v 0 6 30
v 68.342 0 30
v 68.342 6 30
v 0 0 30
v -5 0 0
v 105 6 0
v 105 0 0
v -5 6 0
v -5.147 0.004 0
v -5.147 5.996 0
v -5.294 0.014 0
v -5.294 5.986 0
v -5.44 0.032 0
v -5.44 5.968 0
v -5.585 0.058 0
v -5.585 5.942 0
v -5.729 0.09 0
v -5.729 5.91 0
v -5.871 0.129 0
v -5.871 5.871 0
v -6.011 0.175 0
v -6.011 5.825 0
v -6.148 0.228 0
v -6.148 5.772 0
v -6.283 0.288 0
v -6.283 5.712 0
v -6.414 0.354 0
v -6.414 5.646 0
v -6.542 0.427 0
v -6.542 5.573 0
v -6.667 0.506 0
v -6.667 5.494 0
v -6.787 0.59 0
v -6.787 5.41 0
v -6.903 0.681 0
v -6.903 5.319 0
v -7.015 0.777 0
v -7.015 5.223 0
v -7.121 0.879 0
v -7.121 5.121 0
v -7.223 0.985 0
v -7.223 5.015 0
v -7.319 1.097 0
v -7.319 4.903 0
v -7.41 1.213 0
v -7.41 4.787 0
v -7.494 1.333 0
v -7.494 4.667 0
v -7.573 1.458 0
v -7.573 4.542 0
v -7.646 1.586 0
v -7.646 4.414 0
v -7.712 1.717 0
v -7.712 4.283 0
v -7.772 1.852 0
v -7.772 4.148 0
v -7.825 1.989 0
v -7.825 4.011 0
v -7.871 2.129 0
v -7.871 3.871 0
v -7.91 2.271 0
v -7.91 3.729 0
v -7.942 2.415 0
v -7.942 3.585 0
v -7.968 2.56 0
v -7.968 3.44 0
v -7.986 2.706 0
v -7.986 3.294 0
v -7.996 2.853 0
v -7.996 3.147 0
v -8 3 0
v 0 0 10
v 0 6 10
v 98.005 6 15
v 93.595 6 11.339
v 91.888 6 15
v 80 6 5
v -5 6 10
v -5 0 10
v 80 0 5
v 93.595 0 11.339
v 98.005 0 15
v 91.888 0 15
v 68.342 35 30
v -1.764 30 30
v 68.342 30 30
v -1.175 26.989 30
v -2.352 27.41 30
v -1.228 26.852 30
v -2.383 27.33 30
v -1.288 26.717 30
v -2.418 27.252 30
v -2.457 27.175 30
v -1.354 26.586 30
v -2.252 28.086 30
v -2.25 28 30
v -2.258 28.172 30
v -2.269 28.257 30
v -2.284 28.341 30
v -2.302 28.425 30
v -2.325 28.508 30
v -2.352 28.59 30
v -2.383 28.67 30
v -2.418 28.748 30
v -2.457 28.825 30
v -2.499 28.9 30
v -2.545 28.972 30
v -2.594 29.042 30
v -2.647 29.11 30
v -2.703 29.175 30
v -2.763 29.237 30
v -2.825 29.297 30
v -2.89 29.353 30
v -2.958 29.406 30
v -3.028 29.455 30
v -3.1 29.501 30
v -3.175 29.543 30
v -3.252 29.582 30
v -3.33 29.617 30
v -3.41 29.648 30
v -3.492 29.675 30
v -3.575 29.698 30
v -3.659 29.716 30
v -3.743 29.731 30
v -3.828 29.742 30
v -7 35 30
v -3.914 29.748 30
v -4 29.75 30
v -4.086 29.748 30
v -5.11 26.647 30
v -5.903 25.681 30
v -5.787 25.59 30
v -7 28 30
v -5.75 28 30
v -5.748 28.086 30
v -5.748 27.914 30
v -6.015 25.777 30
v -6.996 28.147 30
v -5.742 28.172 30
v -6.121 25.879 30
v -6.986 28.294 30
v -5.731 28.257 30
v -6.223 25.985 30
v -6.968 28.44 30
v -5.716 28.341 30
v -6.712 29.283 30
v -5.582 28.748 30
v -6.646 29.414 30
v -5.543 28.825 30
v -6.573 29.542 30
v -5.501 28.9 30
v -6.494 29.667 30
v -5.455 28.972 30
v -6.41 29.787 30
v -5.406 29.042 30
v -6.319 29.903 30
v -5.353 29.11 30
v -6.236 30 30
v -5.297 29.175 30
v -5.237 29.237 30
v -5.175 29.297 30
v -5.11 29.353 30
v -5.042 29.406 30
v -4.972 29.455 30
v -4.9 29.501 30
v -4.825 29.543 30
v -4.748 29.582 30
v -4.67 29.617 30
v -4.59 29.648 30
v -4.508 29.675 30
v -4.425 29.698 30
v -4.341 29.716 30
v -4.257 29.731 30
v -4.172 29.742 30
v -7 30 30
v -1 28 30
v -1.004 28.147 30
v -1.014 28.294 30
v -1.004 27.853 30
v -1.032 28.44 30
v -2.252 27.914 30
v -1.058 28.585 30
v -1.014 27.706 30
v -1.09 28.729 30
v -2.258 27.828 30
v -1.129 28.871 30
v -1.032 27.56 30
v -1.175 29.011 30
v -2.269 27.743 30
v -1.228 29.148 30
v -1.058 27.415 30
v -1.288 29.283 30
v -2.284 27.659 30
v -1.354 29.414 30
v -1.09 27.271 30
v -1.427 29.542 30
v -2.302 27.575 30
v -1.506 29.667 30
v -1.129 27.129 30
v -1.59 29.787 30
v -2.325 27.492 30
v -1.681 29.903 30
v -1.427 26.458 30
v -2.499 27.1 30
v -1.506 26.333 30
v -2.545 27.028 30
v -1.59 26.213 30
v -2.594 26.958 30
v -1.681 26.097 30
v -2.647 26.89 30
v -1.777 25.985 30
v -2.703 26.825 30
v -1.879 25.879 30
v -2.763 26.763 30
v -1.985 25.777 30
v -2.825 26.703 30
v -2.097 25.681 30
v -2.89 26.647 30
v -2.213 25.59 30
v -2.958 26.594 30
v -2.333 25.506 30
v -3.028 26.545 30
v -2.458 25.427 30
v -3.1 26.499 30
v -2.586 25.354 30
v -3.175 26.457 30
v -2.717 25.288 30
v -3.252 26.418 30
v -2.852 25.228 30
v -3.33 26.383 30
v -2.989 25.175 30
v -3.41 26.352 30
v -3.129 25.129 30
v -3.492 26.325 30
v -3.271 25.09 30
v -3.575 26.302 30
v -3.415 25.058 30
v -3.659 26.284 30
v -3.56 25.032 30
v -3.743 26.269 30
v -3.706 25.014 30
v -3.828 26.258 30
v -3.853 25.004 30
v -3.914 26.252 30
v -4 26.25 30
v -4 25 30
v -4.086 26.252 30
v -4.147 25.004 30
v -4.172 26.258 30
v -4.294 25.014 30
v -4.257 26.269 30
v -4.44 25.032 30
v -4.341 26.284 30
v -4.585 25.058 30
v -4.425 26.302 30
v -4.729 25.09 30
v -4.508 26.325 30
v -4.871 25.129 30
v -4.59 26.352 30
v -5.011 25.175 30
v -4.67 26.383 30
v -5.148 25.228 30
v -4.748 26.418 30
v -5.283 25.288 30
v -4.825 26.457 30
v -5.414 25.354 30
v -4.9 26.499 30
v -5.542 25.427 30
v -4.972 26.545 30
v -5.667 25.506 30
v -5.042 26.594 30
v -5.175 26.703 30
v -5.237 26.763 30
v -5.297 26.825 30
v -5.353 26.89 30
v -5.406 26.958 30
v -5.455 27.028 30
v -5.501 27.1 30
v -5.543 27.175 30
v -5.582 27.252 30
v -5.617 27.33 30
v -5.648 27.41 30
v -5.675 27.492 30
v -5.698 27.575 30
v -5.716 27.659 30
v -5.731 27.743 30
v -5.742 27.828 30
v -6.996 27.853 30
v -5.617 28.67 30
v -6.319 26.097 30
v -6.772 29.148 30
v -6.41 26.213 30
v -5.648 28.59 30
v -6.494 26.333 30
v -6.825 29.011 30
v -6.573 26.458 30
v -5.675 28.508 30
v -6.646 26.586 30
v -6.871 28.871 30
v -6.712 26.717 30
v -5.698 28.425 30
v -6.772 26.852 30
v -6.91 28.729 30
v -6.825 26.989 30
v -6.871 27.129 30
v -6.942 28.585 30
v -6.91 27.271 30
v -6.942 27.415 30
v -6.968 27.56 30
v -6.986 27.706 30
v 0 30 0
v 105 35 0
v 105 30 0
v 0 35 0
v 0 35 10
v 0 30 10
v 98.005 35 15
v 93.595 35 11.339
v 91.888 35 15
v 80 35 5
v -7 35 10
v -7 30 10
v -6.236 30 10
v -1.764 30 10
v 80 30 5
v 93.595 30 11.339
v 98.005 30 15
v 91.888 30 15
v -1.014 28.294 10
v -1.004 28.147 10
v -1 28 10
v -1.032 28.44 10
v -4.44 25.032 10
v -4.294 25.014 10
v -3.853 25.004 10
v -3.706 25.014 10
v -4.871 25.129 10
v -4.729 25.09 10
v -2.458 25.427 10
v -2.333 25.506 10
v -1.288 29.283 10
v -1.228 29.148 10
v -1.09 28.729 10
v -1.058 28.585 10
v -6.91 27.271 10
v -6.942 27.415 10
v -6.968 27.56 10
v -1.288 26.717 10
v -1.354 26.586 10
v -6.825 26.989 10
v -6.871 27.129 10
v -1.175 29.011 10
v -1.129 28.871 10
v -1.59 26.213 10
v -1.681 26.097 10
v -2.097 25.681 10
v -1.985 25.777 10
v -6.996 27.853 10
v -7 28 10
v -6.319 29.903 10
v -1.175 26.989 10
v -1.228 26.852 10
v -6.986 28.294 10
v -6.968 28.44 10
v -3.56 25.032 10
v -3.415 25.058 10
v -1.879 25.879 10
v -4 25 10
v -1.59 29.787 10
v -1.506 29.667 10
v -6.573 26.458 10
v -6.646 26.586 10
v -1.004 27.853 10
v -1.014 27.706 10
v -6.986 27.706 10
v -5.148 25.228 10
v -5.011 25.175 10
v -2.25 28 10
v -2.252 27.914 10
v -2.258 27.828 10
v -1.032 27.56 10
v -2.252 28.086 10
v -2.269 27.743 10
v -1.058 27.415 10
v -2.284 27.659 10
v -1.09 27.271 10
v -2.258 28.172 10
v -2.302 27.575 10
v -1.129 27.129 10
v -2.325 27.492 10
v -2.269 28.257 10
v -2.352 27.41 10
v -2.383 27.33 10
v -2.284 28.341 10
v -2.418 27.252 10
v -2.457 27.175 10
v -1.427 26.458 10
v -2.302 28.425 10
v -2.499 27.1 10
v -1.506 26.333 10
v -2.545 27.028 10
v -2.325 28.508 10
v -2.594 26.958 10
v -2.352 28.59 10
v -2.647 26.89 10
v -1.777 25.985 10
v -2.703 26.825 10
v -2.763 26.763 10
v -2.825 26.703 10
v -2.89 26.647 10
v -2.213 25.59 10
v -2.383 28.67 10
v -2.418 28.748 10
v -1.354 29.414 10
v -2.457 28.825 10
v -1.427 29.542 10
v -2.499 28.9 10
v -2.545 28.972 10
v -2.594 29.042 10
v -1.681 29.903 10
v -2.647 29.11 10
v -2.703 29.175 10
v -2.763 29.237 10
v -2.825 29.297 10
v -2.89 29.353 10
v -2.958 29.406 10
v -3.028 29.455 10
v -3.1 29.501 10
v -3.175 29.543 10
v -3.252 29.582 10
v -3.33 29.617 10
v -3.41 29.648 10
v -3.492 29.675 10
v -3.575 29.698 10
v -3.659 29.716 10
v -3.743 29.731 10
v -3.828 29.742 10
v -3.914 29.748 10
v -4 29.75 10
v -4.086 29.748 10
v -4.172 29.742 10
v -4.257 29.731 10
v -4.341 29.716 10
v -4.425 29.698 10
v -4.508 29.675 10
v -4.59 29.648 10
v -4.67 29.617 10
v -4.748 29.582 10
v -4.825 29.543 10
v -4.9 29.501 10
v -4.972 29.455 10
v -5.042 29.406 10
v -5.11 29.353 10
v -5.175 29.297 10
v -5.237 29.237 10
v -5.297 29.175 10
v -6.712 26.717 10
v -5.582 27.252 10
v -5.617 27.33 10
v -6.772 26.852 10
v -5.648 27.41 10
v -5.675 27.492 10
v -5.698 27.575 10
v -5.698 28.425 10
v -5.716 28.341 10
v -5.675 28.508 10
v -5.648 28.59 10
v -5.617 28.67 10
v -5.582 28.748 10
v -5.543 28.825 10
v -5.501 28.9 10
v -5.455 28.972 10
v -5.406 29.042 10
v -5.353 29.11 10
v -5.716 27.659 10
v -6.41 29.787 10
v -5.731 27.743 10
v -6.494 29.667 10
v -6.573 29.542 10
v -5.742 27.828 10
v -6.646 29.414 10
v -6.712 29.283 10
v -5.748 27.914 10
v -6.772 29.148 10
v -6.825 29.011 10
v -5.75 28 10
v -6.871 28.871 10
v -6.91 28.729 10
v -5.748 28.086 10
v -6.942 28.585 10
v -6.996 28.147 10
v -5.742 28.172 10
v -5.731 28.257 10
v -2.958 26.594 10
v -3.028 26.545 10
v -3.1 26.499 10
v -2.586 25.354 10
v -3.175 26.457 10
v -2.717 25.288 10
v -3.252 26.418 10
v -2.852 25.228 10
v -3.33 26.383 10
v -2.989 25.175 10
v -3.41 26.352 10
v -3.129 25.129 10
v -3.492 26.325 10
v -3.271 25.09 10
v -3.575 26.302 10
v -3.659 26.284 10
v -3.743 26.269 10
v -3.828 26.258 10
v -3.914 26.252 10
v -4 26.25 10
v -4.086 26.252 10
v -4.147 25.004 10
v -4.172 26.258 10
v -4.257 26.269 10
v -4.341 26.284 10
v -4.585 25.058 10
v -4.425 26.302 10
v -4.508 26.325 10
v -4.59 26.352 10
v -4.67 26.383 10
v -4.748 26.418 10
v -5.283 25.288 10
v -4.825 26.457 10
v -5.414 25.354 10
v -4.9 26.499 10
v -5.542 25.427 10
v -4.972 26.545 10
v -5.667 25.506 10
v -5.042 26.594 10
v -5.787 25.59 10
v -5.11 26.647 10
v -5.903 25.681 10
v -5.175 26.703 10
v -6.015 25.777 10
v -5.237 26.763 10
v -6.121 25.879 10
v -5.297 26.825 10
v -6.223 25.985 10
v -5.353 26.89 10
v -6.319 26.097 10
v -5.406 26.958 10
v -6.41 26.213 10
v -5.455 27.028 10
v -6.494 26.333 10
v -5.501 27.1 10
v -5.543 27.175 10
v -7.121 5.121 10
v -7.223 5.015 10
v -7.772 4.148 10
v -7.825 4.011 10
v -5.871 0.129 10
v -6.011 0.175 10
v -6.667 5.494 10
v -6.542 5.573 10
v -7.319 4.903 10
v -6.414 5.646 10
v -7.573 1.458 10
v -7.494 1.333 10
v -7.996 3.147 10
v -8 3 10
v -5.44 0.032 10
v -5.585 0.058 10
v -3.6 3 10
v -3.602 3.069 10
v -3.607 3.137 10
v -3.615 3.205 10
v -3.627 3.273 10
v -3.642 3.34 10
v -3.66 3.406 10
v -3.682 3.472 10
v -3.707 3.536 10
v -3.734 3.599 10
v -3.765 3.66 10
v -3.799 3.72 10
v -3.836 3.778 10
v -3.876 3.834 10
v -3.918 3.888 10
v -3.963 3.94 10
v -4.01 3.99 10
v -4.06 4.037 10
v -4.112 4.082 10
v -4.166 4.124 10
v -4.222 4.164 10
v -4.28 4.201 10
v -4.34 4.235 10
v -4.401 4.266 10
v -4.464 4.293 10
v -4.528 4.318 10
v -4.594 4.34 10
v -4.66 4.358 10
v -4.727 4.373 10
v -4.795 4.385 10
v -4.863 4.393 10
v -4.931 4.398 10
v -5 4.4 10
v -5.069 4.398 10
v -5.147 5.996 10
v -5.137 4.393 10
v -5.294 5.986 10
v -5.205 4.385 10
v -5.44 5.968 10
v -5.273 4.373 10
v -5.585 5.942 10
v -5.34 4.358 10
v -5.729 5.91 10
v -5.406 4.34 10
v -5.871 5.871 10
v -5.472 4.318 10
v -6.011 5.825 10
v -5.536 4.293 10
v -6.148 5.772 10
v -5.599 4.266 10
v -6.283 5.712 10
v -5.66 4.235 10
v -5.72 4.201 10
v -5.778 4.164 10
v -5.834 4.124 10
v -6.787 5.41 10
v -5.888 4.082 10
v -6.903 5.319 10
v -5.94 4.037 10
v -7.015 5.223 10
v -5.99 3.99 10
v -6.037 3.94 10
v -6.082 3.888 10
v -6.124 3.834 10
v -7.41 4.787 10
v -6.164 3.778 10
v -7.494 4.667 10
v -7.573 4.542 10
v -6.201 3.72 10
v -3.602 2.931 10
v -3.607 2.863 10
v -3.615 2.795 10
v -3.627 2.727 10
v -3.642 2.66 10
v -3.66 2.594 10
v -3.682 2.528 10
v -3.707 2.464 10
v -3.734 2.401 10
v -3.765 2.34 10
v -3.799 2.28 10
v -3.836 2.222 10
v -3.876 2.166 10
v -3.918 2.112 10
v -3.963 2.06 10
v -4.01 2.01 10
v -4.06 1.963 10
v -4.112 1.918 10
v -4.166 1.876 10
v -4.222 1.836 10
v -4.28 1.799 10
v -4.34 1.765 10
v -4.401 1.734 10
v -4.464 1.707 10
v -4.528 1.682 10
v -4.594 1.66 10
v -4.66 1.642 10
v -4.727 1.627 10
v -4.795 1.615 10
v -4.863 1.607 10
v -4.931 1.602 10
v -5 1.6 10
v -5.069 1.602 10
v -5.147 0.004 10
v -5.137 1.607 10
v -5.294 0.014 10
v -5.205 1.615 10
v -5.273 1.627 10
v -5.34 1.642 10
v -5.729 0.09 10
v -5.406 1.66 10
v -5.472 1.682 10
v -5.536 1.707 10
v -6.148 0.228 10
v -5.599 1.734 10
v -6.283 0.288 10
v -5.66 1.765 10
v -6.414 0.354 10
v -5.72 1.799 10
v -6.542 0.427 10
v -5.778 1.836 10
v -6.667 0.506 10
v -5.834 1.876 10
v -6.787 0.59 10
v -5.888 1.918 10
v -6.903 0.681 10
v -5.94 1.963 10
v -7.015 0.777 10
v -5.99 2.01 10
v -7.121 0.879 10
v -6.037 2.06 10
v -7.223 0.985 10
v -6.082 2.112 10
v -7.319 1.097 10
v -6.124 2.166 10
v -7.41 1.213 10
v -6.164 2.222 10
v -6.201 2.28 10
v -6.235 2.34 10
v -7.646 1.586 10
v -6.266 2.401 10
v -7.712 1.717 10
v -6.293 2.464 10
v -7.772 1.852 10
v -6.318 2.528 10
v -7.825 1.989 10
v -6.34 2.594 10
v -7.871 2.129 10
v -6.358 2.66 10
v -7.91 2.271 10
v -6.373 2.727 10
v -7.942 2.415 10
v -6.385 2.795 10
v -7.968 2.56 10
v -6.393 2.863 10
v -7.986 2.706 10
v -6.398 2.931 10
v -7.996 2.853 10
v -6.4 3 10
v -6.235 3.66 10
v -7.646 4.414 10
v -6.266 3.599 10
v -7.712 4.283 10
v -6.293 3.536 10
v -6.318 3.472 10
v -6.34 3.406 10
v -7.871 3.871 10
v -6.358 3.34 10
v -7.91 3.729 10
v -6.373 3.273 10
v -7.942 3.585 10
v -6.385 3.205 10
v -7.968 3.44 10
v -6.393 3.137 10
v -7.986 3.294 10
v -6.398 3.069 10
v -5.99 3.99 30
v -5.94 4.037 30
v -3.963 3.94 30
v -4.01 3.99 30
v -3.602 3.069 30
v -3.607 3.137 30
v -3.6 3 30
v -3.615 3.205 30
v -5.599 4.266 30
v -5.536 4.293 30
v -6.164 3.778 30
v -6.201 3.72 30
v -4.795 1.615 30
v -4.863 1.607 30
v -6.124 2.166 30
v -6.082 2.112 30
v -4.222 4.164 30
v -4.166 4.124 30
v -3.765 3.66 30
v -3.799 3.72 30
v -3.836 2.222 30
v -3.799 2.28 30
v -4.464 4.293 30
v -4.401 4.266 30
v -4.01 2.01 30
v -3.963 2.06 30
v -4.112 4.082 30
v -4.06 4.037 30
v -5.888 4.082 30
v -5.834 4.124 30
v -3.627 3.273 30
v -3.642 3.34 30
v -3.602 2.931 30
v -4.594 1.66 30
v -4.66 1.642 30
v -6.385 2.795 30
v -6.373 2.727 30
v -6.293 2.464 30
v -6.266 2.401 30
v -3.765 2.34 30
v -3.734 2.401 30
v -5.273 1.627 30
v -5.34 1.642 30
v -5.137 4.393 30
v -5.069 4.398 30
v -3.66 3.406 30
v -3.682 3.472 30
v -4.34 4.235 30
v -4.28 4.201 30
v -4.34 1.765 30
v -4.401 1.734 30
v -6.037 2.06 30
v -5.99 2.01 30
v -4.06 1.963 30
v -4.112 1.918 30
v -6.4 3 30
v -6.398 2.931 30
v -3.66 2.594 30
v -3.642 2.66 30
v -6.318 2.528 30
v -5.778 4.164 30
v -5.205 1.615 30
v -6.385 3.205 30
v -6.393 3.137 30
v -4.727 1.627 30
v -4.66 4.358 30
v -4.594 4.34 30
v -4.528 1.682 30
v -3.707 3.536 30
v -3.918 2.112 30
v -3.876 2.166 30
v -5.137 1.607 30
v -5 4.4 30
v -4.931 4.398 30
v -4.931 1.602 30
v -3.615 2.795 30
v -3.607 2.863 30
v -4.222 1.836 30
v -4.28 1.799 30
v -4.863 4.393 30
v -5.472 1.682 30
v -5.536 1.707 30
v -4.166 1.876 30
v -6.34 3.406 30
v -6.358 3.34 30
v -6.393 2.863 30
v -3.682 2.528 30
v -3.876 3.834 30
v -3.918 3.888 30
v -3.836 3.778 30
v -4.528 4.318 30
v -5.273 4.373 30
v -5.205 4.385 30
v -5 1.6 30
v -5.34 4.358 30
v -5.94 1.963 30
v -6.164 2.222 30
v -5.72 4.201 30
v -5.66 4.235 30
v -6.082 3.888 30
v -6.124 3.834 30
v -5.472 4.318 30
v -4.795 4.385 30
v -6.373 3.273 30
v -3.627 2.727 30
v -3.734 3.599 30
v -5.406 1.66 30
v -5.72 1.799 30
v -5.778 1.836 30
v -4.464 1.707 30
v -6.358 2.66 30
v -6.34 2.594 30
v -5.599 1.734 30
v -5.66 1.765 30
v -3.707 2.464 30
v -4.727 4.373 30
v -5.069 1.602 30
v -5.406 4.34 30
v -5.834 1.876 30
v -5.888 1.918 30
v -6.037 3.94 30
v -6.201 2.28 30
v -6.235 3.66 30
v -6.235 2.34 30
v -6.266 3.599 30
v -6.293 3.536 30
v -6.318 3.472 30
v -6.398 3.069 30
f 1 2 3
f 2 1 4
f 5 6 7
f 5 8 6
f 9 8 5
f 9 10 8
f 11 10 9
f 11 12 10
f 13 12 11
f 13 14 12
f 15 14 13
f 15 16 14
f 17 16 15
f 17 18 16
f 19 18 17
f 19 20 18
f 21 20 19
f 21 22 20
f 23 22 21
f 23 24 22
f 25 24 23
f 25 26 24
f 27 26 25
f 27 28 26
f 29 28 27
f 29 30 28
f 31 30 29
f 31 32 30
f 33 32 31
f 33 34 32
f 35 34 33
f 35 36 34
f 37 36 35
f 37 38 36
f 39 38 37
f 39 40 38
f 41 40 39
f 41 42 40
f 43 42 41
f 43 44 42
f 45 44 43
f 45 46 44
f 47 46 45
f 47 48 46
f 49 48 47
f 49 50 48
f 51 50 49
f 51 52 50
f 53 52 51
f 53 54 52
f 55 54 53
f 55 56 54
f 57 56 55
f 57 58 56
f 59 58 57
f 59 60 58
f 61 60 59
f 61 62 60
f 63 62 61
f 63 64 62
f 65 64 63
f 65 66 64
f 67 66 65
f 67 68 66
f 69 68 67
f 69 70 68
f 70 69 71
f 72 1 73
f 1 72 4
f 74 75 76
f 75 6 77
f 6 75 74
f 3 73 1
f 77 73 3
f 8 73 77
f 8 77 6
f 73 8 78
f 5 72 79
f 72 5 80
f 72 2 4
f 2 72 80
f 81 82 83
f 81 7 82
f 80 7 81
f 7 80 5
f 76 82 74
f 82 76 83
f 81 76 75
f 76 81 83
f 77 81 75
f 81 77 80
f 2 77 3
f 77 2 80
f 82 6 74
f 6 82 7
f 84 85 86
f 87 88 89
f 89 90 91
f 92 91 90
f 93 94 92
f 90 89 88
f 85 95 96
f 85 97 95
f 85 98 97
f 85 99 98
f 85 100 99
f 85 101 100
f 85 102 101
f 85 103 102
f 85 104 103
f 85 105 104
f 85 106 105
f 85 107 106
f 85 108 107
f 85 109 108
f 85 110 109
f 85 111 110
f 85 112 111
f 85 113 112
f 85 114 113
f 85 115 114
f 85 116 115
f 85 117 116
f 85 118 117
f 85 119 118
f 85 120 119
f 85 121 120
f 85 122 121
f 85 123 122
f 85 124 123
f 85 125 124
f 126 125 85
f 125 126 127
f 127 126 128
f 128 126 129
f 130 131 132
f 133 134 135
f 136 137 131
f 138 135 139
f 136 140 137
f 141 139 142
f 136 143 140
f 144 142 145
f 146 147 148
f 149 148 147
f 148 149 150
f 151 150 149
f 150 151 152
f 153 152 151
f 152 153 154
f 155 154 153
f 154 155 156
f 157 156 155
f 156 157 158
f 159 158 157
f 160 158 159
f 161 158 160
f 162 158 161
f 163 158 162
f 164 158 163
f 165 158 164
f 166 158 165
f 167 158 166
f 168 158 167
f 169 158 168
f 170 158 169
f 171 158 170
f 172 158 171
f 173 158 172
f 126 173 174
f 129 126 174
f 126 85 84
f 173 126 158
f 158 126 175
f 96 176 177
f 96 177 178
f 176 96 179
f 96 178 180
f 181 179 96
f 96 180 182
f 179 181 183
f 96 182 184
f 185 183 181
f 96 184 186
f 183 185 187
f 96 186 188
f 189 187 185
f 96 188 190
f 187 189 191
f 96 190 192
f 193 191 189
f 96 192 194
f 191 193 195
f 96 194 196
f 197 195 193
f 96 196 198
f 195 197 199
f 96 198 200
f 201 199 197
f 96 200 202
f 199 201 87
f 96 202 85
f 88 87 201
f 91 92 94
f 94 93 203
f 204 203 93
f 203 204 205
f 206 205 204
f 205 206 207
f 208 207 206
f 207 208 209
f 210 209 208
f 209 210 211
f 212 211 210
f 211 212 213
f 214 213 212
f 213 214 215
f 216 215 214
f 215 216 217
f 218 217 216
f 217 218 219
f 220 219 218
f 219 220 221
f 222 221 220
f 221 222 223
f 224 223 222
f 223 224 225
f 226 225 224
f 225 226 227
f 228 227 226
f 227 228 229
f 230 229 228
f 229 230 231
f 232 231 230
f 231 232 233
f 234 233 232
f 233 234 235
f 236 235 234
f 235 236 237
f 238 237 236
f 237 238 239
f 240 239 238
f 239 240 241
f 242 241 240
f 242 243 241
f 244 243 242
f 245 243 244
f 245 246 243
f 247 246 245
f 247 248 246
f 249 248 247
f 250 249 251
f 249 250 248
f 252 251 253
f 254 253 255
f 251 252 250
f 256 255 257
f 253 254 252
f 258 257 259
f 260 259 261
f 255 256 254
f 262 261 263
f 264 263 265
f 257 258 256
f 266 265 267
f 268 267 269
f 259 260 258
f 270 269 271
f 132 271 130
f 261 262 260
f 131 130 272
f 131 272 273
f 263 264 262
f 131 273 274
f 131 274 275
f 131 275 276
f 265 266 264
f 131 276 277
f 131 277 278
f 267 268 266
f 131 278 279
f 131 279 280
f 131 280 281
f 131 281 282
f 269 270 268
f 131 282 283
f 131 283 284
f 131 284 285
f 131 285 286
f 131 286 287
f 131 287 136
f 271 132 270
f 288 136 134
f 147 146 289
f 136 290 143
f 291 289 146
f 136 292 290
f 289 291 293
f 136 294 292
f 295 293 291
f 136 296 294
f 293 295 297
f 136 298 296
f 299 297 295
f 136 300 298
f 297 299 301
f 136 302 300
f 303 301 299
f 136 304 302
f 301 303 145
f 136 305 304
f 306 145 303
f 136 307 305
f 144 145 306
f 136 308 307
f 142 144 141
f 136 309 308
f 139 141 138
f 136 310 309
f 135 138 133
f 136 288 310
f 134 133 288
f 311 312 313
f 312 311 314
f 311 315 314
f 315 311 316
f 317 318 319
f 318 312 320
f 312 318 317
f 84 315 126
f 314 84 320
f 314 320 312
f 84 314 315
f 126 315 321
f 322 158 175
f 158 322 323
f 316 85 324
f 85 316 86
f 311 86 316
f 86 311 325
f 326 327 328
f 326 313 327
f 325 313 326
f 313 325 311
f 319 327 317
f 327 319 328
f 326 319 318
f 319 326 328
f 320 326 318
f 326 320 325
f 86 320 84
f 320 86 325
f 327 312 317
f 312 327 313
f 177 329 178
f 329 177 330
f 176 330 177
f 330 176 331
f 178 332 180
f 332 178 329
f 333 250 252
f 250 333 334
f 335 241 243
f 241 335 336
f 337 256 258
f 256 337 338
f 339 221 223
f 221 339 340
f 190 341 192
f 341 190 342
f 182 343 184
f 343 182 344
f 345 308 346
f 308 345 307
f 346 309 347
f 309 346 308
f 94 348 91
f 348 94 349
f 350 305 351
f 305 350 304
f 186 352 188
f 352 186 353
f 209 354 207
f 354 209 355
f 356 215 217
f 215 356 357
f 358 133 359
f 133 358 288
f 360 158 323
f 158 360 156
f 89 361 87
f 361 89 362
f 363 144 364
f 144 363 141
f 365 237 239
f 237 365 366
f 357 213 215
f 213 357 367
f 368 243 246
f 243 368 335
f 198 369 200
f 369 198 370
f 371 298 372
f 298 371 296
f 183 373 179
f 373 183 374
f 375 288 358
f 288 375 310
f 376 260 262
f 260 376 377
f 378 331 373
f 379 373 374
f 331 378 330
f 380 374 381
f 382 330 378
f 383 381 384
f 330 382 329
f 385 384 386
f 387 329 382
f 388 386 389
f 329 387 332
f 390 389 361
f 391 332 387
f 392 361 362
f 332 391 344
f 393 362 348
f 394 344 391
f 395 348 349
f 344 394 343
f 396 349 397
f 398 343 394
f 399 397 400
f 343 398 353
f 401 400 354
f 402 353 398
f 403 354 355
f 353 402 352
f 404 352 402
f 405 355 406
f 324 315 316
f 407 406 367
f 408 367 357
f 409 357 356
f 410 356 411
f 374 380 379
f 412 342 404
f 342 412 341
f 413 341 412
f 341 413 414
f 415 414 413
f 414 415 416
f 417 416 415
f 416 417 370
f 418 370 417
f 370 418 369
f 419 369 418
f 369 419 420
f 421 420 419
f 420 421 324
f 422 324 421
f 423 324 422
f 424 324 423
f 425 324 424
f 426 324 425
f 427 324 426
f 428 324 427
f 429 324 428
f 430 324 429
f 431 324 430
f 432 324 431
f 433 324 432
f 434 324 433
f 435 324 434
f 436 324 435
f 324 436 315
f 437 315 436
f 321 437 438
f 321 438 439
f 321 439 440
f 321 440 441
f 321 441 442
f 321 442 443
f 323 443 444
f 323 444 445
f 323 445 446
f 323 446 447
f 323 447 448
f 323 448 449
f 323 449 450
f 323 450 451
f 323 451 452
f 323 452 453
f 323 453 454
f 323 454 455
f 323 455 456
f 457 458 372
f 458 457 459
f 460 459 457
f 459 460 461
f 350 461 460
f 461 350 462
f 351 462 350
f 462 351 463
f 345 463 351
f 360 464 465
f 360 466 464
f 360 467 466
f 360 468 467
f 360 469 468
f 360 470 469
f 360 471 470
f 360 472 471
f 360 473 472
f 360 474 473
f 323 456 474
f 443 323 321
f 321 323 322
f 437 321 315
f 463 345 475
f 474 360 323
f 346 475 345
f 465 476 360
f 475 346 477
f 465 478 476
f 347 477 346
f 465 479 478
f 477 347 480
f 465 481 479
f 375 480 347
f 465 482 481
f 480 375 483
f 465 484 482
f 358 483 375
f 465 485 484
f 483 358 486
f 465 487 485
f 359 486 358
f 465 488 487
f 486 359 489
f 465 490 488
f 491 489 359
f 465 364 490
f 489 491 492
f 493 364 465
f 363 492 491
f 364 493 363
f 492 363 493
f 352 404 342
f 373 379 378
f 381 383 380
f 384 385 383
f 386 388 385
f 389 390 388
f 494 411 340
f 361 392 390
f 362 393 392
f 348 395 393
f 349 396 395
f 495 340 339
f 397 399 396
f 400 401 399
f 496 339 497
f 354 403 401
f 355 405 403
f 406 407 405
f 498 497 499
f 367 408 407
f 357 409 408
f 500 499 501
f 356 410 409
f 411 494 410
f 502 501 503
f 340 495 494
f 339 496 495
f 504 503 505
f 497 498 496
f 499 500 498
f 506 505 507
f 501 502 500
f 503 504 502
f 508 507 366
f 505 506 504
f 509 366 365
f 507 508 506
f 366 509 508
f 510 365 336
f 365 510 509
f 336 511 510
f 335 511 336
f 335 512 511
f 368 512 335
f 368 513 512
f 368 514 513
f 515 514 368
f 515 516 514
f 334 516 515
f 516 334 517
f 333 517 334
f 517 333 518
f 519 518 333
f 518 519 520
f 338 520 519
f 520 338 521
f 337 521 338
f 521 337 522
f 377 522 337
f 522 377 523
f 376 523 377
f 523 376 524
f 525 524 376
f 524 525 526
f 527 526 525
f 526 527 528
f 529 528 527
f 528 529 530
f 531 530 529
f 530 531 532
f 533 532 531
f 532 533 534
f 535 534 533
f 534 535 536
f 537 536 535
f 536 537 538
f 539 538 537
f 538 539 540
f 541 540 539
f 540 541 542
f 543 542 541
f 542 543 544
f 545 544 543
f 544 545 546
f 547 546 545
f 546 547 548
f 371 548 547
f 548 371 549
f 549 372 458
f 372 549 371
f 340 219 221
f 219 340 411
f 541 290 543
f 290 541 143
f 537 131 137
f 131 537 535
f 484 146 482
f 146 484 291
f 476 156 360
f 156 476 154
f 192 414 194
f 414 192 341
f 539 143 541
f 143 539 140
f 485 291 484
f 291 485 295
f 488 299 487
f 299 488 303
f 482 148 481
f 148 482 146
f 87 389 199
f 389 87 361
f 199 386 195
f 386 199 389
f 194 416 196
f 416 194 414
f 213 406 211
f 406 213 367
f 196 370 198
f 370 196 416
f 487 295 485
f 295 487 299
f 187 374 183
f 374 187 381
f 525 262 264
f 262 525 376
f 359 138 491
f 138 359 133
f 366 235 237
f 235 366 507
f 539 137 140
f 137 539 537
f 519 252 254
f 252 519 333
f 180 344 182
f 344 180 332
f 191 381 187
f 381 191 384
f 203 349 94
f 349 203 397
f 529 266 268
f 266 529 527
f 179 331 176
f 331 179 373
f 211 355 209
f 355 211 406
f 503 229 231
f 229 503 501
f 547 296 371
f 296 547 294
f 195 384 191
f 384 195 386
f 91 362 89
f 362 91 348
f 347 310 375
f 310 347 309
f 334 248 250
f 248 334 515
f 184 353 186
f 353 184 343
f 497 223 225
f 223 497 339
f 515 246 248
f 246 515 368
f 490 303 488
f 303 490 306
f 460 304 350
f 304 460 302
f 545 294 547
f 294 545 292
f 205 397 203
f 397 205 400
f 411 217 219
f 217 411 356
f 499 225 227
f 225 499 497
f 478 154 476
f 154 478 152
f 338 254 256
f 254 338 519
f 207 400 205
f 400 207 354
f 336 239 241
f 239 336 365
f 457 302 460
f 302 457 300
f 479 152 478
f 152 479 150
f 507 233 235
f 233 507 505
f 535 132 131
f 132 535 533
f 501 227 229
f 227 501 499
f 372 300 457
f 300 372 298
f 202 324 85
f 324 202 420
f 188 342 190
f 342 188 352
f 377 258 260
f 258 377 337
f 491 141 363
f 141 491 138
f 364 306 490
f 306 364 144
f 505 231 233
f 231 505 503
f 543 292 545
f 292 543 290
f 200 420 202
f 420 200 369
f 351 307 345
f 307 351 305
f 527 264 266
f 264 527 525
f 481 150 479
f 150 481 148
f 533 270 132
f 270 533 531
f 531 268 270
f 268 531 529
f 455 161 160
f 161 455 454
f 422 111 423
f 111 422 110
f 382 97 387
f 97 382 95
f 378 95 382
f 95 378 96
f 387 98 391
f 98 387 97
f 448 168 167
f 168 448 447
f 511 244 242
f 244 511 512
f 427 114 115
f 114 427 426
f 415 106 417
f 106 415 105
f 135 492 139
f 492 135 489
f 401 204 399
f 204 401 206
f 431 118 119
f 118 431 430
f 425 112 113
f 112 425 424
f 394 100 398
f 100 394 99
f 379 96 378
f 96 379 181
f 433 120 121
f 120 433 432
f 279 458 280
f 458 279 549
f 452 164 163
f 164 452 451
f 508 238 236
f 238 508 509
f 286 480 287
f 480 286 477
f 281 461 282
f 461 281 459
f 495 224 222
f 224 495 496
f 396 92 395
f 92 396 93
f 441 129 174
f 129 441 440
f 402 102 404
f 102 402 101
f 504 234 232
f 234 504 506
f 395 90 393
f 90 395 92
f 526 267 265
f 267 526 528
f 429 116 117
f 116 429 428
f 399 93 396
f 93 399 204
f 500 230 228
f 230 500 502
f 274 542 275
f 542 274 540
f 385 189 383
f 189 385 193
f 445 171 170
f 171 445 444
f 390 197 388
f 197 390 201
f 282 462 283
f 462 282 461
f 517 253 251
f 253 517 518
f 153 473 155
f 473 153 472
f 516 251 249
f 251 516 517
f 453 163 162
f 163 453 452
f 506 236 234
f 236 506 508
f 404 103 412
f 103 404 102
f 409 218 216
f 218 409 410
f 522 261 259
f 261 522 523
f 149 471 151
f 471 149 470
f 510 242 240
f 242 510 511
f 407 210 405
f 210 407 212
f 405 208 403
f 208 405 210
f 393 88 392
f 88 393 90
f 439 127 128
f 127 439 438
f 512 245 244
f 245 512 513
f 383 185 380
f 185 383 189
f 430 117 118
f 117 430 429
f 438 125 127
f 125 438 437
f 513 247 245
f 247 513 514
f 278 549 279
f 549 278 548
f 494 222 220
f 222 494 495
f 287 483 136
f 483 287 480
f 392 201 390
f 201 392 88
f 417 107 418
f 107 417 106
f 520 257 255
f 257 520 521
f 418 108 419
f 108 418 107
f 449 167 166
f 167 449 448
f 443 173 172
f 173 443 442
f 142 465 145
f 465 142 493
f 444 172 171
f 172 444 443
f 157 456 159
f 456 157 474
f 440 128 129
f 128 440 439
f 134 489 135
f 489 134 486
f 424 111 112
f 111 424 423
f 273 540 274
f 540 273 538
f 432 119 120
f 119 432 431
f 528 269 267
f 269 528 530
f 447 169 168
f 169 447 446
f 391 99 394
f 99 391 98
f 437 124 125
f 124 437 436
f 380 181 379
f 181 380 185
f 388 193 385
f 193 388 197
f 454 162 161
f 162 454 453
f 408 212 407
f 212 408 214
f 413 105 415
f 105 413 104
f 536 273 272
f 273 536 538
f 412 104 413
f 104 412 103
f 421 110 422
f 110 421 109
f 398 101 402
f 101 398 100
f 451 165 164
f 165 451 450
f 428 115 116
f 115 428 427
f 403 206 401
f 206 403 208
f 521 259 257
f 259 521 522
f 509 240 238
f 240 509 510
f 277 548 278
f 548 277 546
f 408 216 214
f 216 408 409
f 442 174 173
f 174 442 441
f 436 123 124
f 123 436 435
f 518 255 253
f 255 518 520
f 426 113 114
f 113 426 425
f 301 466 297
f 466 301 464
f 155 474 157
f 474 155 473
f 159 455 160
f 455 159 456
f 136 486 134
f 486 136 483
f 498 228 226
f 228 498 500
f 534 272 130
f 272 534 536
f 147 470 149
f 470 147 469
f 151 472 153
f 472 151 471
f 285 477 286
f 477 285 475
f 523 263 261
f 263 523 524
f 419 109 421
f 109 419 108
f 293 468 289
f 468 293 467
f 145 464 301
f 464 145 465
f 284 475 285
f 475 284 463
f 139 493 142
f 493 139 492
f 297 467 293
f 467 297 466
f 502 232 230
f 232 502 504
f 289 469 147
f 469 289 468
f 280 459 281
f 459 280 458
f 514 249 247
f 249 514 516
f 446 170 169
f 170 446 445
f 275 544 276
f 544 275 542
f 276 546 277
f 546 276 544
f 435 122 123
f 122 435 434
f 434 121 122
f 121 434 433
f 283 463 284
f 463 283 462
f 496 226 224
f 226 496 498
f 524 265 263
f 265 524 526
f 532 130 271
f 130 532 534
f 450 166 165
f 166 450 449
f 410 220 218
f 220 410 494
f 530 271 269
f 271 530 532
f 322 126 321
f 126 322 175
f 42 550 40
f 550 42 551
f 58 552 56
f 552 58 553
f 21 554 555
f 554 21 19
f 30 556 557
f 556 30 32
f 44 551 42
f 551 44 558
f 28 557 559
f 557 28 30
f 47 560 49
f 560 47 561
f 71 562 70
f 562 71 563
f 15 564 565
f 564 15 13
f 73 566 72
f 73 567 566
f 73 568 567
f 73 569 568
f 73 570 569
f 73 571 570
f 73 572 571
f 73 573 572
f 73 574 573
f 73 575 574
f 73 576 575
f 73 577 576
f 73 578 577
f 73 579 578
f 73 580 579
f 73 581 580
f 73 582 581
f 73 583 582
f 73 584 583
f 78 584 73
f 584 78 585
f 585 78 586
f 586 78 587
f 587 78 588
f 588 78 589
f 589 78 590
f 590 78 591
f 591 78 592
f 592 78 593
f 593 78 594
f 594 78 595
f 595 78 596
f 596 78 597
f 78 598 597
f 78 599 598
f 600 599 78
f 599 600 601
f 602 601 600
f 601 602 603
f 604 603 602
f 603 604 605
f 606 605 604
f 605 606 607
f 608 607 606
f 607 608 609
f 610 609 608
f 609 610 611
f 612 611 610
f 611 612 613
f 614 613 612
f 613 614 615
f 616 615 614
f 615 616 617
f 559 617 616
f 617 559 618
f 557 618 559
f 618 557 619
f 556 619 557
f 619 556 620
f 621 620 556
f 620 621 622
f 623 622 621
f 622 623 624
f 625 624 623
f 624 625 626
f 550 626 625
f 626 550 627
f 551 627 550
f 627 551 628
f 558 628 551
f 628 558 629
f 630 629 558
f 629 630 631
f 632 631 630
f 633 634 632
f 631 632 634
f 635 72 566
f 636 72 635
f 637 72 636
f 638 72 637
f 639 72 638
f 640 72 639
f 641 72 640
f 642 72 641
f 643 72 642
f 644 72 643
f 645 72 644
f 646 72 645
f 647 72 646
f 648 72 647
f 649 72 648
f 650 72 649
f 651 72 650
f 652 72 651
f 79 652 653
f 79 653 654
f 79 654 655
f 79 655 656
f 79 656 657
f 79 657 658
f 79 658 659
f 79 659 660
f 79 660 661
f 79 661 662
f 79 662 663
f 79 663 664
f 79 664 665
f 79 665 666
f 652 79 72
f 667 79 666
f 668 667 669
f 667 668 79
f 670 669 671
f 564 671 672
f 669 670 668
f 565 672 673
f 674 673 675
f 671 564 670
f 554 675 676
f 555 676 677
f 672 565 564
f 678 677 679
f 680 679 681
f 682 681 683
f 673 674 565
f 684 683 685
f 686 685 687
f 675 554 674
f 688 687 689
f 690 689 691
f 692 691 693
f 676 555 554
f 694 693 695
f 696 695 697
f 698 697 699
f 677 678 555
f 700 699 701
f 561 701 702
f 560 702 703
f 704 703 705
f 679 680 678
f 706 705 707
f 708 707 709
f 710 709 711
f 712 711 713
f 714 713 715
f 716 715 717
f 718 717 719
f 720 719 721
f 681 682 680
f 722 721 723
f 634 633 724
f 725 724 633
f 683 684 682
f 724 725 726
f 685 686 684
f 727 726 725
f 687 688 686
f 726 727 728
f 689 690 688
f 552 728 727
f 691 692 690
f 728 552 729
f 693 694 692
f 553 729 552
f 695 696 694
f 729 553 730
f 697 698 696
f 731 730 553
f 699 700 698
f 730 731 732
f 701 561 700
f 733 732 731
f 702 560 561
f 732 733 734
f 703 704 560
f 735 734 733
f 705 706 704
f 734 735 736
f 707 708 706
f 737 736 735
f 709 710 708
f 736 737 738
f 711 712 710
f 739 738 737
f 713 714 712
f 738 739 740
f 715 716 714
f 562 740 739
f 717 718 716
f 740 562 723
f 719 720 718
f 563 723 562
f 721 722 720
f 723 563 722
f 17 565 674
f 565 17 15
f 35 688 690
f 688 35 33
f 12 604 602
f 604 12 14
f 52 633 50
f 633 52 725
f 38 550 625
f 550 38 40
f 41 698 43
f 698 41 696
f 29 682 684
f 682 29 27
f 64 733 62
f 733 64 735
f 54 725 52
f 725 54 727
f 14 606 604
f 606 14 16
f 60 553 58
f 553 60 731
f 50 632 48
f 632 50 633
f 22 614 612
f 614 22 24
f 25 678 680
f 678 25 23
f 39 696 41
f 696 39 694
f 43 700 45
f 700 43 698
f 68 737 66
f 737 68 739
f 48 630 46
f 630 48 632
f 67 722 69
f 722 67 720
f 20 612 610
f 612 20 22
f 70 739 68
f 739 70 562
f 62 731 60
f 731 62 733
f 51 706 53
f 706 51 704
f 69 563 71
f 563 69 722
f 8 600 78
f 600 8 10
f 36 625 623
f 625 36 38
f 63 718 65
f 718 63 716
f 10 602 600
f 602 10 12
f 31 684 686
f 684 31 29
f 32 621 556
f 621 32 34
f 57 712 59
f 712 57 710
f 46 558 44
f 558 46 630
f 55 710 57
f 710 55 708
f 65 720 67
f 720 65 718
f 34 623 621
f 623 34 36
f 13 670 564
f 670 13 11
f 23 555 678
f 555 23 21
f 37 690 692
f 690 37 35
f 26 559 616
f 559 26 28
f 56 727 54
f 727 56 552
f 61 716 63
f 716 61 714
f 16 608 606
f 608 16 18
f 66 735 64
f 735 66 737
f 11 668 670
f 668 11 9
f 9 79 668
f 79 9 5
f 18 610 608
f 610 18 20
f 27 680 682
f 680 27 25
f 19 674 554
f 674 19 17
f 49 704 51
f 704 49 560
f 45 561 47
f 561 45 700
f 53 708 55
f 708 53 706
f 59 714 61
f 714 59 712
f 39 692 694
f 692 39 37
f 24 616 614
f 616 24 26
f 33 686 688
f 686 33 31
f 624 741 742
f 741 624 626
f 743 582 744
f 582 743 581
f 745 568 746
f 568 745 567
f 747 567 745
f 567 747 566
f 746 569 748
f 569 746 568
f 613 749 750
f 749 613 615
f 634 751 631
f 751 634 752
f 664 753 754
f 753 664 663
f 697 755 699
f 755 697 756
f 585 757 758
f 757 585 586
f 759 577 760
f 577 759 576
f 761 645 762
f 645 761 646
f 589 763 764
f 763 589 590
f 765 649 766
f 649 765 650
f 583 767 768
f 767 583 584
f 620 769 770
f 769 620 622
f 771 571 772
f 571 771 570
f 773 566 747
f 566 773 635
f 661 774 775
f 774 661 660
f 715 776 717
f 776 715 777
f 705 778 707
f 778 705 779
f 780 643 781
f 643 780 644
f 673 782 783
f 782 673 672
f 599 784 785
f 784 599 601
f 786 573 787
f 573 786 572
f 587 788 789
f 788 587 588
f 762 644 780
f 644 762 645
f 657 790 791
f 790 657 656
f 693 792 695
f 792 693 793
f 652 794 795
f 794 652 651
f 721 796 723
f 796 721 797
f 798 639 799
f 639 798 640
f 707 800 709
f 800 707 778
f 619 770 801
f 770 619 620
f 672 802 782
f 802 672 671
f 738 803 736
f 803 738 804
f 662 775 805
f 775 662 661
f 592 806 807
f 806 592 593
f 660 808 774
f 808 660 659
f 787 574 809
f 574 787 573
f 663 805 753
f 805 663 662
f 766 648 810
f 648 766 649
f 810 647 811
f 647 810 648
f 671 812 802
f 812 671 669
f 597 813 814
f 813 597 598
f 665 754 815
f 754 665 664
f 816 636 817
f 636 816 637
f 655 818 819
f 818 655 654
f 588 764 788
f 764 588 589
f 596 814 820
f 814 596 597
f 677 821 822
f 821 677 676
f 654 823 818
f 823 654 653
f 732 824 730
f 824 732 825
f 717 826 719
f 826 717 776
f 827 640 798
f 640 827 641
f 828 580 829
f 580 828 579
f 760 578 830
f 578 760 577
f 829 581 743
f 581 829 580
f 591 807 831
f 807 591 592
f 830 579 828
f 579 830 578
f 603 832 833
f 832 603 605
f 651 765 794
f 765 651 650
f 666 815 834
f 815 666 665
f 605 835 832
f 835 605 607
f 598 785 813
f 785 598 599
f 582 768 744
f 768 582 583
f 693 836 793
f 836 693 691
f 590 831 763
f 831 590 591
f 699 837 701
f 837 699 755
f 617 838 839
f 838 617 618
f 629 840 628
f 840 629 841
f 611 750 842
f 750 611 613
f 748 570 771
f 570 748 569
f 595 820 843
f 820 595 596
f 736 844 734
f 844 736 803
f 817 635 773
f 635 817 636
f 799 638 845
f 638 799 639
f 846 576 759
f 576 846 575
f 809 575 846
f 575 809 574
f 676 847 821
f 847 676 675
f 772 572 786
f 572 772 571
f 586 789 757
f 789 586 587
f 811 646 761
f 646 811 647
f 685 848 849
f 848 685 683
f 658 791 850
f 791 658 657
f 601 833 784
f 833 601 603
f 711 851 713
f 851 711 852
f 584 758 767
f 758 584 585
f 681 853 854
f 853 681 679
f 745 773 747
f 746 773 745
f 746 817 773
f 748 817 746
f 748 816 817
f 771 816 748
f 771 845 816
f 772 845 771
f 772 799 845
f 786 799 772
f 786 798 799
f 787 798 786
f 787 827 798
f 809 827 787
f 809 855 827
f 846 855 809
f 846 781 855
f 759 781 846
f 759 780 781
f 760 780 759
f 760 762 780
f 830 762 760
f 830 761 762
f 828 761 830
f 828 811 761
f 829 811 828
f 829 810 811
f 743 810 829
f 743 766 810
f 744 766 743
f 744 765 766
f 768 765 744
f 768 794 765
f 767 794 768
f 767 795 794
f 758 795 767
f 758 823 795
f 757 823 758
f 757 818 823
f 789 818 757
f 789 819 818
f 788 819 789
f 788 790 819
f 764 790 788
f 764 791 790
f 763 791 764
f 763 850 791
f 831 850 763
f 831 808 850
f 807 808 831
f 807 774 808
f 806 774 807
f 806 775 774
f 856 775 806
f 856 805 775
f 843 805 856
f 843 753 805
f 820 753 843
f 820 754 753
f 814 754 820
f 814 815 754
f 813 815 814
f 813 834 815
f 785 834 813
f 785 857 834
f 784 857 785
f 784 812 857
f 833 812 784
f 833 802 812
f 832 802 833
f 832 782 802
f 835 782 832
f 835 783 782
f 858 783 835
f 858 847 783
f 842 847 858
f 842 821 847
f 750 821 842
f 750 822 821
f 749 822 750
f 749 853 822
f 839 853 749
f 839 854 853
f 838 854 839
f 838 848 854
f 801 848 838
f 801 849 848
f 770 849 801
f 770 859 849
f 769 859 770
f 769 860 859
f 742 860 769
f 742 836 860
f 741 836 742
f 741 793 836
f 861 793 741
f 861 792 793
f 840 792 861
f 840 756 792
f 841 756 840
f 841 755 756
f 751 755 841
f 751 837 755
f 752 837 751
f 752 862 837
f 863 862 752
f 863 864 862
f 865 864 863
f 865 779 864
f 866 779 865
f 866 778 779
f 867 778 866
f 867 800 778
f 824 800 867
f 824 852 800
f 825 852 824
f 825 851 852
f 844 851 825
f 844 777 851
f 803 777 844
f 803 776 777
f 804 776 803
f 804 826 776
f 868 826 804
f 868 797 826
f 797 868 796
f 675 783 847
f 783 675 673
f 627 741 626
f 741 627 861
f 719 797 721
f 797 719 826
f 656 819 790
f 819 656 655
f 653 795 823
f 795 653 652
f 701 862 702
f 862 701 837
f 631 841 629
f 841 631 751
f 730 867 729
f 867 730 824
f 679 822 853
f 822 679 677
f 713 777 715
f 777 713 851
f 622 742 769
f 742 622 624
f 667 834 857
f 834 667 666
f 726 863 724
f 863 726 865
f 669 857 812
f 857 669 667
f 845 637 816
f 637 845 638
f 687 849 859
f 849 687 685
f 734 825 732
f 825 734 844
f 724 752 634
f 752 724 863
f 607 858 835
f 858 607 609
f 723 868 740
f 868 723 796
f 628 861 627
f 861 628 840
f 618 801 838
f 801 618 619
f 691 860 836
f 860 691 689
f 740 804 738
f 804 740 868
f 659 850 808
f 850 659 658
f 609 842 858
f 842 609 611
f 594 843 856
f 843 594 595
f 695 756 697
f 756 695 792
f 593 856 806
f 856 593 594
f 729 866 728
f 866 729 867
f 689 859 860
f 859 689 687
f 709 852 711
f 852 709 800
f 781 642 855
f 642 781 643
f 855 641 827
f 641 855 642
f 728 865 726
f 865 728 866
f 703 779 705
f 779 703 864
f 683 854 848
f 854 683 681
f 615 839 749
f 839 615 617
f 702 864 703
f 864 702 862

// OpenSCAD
$fn=128;
difference()
{
  cube([105,6,30]);
  translate([76,-2,15]) cube([30,10,30]);
  translate([80,-2,5]) rotate([0,-25,0]) cube([15,10,30]);
  translate([105,-2,0]) rotate([0,-25,0]) cube([15,10,30]);
}
translate([-5,3,0]) cylinder(h=10,d=6);
translate([-5,3,0]) cylinder(h=30,d=2.8);
translate([-5,0,0]) cube([5,6,10]);

translate([0,30,0])
{
  difference()
  {
    cube([105,5,30]);
    translate([76,-2,15]) cube([30,10,30]);
    translate([80,-2,5]) rotate([0,-25,0]) cube([15,10,30]);
    translate([105,-2,0]) rotate([0,-25,0]) cube([15,10,30]);
  }
  translate([-7,0,10]) cube([7,5,20]);  
  difference()
  {
    translate([-4,-2,10]) cylinder(h=20,d=6);
    translate([-4,-2,-2]) cylinder(h=35,d=3.5);
//    translate([-9,-5,-2]) cube([10,15,15]);
  }
  
}
//translate([25,4,5]) rotate([90,0,0])
//linear_extrude(height=5)
//import("ÖruggtNet-wide-slogan.svg",dpi=1);
